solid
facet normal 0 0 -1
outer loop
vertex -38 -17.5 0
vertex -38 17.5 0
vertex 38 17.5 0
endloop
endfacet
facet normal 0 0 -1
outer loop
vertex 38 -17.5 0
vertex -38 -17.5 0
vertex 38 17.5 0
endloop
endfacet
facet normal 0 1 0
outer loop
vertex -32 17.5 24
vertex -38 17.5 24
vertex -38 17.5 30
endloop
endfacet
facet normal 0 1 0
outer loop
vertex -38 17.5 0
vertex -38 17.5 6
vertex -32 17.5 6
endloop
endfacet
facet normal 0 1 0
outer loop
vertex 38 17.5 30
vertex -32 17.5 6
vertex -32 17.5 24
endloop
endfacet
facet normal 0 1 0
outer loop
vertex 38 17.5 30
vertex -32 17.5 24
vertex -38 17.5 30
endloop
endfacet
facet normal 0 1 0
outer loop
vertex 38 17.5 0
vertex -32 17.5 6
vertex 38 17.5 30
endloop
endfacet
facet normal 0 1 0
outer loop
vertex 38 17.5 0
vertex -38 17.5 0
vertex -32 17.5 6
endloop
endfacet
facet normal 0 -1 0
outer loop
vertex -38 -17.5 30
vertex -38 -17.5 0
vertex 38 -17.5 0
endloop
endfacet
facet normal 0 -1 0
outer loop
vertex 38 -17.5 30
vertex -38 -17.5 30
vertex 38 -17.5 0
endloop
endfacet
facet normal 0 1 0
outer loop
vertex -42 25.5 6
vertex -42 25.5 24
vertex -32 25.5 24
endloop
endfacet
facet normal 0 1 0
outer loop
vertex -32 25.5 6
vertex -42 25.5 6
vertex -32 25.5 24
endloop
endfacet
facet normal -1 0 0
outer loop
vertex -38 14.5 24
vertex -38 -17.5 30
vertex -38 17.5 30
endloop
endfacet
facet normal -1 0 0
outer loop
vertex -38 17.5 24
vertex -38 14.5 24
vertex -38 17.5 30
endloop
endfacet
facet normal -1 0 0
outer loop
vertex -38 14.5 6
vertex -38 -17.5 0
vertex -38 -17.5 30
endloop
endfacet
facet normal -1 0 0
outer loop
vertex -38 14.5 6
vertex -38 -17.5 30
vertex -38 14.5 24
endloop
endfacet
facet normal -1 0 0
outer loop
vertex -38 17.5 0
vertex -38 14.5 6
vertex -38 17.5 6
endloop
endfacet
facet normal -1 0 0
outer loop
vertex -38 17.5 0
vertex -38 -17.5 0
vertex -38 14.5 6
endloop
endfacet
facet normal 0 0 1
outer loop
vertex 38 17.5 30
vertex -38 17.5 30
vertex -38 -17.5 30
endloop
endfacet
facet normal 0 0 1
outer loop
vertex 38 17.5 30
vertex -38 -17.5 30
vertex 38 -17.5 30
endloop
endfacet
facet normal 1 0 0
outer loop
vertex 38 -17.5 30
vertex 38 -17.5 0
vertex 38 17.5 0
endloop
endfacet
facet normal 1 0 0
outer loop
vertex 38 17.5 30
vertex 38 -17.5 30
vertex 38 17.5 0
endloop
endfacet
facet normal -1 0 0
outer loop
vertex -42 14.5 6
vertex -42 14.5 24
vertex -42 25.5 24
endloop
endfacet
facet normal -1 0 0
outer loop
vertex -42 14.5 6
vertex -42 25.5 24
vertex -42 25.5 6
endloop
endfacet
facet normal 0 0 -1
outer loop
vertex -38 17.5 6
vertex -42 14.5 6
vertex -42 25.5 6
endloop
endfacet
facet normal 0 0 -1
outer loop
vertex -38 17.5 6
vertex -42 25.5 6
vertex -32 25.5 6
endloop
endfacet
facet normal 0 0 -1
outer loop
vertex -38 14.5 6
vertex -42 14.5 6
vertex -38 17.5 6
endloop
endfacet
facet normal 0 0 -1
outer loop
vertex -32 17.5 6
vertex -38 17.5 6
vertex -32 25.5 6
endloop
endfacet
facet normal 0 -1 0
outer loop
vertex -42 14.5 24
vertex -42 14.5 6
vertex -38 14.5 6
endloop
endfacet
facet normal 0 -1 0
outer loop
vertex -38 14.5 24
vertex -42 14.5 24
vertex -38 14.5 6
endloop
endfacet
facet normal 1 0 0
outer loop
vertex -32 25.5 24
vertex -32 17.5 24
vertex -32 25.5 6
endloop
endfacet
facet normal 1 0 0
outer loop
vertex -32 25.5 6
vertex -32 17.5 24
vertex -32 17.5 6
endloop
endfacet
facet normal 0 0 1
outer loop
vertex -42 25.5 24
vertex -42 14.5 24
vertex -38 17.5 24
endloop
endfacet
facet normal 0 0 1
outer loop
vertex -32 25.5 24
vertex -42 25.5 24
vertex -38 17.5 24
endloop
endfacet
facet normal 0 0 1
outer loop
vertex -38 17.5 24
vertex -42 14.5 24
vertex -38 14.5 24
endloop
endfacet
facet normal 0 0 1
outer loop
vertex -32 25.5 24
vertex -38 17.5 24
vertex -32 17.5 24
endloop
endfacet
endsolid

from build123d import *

# Parameters (mm, degrees)
SKETCH1_W                = 76
SKETCH1_H                = 35
BOSS_EXTRUDE1_DEPTH      = 30
BOSS_EXTRUDE2_DEPTH      = 8
BOSS_EXTRUDE2_DEPTH_BACK = 3
SKETCH2_W                = 10
SKETCH2_H                = 18


with BuildPart() as part:
    # Sketch1 → Boss-Extrude1 (new body)
    with BuildSketch(Plane.XY):
        Rectangle(SKETCH1_W, SKETCH1_H)
    extrude(amount=BOSS_EXTRUDE1_DEPTH)

    # Sketch2 → Boss-Extrude2 (add, two sides: drawn at the far end of the back side and taken through both)
    with BuildSketch(Plane(origin=(0, 17.5, 0), x_dir=(1, 0, 0), z_dir=(0, 1, 0)).offset(-BOSS_EXTRUDE2_DEPTH_BACK)):
        with Locations((-37, -15)):
            Rectangle(SKETCH2_W, SKETCH2_H)
    extrude(amount=BOSS_EXTRUDE2_DEPTH + BOSS_EXTRUDE2_DEPTH_BACK)


solid = part.part
